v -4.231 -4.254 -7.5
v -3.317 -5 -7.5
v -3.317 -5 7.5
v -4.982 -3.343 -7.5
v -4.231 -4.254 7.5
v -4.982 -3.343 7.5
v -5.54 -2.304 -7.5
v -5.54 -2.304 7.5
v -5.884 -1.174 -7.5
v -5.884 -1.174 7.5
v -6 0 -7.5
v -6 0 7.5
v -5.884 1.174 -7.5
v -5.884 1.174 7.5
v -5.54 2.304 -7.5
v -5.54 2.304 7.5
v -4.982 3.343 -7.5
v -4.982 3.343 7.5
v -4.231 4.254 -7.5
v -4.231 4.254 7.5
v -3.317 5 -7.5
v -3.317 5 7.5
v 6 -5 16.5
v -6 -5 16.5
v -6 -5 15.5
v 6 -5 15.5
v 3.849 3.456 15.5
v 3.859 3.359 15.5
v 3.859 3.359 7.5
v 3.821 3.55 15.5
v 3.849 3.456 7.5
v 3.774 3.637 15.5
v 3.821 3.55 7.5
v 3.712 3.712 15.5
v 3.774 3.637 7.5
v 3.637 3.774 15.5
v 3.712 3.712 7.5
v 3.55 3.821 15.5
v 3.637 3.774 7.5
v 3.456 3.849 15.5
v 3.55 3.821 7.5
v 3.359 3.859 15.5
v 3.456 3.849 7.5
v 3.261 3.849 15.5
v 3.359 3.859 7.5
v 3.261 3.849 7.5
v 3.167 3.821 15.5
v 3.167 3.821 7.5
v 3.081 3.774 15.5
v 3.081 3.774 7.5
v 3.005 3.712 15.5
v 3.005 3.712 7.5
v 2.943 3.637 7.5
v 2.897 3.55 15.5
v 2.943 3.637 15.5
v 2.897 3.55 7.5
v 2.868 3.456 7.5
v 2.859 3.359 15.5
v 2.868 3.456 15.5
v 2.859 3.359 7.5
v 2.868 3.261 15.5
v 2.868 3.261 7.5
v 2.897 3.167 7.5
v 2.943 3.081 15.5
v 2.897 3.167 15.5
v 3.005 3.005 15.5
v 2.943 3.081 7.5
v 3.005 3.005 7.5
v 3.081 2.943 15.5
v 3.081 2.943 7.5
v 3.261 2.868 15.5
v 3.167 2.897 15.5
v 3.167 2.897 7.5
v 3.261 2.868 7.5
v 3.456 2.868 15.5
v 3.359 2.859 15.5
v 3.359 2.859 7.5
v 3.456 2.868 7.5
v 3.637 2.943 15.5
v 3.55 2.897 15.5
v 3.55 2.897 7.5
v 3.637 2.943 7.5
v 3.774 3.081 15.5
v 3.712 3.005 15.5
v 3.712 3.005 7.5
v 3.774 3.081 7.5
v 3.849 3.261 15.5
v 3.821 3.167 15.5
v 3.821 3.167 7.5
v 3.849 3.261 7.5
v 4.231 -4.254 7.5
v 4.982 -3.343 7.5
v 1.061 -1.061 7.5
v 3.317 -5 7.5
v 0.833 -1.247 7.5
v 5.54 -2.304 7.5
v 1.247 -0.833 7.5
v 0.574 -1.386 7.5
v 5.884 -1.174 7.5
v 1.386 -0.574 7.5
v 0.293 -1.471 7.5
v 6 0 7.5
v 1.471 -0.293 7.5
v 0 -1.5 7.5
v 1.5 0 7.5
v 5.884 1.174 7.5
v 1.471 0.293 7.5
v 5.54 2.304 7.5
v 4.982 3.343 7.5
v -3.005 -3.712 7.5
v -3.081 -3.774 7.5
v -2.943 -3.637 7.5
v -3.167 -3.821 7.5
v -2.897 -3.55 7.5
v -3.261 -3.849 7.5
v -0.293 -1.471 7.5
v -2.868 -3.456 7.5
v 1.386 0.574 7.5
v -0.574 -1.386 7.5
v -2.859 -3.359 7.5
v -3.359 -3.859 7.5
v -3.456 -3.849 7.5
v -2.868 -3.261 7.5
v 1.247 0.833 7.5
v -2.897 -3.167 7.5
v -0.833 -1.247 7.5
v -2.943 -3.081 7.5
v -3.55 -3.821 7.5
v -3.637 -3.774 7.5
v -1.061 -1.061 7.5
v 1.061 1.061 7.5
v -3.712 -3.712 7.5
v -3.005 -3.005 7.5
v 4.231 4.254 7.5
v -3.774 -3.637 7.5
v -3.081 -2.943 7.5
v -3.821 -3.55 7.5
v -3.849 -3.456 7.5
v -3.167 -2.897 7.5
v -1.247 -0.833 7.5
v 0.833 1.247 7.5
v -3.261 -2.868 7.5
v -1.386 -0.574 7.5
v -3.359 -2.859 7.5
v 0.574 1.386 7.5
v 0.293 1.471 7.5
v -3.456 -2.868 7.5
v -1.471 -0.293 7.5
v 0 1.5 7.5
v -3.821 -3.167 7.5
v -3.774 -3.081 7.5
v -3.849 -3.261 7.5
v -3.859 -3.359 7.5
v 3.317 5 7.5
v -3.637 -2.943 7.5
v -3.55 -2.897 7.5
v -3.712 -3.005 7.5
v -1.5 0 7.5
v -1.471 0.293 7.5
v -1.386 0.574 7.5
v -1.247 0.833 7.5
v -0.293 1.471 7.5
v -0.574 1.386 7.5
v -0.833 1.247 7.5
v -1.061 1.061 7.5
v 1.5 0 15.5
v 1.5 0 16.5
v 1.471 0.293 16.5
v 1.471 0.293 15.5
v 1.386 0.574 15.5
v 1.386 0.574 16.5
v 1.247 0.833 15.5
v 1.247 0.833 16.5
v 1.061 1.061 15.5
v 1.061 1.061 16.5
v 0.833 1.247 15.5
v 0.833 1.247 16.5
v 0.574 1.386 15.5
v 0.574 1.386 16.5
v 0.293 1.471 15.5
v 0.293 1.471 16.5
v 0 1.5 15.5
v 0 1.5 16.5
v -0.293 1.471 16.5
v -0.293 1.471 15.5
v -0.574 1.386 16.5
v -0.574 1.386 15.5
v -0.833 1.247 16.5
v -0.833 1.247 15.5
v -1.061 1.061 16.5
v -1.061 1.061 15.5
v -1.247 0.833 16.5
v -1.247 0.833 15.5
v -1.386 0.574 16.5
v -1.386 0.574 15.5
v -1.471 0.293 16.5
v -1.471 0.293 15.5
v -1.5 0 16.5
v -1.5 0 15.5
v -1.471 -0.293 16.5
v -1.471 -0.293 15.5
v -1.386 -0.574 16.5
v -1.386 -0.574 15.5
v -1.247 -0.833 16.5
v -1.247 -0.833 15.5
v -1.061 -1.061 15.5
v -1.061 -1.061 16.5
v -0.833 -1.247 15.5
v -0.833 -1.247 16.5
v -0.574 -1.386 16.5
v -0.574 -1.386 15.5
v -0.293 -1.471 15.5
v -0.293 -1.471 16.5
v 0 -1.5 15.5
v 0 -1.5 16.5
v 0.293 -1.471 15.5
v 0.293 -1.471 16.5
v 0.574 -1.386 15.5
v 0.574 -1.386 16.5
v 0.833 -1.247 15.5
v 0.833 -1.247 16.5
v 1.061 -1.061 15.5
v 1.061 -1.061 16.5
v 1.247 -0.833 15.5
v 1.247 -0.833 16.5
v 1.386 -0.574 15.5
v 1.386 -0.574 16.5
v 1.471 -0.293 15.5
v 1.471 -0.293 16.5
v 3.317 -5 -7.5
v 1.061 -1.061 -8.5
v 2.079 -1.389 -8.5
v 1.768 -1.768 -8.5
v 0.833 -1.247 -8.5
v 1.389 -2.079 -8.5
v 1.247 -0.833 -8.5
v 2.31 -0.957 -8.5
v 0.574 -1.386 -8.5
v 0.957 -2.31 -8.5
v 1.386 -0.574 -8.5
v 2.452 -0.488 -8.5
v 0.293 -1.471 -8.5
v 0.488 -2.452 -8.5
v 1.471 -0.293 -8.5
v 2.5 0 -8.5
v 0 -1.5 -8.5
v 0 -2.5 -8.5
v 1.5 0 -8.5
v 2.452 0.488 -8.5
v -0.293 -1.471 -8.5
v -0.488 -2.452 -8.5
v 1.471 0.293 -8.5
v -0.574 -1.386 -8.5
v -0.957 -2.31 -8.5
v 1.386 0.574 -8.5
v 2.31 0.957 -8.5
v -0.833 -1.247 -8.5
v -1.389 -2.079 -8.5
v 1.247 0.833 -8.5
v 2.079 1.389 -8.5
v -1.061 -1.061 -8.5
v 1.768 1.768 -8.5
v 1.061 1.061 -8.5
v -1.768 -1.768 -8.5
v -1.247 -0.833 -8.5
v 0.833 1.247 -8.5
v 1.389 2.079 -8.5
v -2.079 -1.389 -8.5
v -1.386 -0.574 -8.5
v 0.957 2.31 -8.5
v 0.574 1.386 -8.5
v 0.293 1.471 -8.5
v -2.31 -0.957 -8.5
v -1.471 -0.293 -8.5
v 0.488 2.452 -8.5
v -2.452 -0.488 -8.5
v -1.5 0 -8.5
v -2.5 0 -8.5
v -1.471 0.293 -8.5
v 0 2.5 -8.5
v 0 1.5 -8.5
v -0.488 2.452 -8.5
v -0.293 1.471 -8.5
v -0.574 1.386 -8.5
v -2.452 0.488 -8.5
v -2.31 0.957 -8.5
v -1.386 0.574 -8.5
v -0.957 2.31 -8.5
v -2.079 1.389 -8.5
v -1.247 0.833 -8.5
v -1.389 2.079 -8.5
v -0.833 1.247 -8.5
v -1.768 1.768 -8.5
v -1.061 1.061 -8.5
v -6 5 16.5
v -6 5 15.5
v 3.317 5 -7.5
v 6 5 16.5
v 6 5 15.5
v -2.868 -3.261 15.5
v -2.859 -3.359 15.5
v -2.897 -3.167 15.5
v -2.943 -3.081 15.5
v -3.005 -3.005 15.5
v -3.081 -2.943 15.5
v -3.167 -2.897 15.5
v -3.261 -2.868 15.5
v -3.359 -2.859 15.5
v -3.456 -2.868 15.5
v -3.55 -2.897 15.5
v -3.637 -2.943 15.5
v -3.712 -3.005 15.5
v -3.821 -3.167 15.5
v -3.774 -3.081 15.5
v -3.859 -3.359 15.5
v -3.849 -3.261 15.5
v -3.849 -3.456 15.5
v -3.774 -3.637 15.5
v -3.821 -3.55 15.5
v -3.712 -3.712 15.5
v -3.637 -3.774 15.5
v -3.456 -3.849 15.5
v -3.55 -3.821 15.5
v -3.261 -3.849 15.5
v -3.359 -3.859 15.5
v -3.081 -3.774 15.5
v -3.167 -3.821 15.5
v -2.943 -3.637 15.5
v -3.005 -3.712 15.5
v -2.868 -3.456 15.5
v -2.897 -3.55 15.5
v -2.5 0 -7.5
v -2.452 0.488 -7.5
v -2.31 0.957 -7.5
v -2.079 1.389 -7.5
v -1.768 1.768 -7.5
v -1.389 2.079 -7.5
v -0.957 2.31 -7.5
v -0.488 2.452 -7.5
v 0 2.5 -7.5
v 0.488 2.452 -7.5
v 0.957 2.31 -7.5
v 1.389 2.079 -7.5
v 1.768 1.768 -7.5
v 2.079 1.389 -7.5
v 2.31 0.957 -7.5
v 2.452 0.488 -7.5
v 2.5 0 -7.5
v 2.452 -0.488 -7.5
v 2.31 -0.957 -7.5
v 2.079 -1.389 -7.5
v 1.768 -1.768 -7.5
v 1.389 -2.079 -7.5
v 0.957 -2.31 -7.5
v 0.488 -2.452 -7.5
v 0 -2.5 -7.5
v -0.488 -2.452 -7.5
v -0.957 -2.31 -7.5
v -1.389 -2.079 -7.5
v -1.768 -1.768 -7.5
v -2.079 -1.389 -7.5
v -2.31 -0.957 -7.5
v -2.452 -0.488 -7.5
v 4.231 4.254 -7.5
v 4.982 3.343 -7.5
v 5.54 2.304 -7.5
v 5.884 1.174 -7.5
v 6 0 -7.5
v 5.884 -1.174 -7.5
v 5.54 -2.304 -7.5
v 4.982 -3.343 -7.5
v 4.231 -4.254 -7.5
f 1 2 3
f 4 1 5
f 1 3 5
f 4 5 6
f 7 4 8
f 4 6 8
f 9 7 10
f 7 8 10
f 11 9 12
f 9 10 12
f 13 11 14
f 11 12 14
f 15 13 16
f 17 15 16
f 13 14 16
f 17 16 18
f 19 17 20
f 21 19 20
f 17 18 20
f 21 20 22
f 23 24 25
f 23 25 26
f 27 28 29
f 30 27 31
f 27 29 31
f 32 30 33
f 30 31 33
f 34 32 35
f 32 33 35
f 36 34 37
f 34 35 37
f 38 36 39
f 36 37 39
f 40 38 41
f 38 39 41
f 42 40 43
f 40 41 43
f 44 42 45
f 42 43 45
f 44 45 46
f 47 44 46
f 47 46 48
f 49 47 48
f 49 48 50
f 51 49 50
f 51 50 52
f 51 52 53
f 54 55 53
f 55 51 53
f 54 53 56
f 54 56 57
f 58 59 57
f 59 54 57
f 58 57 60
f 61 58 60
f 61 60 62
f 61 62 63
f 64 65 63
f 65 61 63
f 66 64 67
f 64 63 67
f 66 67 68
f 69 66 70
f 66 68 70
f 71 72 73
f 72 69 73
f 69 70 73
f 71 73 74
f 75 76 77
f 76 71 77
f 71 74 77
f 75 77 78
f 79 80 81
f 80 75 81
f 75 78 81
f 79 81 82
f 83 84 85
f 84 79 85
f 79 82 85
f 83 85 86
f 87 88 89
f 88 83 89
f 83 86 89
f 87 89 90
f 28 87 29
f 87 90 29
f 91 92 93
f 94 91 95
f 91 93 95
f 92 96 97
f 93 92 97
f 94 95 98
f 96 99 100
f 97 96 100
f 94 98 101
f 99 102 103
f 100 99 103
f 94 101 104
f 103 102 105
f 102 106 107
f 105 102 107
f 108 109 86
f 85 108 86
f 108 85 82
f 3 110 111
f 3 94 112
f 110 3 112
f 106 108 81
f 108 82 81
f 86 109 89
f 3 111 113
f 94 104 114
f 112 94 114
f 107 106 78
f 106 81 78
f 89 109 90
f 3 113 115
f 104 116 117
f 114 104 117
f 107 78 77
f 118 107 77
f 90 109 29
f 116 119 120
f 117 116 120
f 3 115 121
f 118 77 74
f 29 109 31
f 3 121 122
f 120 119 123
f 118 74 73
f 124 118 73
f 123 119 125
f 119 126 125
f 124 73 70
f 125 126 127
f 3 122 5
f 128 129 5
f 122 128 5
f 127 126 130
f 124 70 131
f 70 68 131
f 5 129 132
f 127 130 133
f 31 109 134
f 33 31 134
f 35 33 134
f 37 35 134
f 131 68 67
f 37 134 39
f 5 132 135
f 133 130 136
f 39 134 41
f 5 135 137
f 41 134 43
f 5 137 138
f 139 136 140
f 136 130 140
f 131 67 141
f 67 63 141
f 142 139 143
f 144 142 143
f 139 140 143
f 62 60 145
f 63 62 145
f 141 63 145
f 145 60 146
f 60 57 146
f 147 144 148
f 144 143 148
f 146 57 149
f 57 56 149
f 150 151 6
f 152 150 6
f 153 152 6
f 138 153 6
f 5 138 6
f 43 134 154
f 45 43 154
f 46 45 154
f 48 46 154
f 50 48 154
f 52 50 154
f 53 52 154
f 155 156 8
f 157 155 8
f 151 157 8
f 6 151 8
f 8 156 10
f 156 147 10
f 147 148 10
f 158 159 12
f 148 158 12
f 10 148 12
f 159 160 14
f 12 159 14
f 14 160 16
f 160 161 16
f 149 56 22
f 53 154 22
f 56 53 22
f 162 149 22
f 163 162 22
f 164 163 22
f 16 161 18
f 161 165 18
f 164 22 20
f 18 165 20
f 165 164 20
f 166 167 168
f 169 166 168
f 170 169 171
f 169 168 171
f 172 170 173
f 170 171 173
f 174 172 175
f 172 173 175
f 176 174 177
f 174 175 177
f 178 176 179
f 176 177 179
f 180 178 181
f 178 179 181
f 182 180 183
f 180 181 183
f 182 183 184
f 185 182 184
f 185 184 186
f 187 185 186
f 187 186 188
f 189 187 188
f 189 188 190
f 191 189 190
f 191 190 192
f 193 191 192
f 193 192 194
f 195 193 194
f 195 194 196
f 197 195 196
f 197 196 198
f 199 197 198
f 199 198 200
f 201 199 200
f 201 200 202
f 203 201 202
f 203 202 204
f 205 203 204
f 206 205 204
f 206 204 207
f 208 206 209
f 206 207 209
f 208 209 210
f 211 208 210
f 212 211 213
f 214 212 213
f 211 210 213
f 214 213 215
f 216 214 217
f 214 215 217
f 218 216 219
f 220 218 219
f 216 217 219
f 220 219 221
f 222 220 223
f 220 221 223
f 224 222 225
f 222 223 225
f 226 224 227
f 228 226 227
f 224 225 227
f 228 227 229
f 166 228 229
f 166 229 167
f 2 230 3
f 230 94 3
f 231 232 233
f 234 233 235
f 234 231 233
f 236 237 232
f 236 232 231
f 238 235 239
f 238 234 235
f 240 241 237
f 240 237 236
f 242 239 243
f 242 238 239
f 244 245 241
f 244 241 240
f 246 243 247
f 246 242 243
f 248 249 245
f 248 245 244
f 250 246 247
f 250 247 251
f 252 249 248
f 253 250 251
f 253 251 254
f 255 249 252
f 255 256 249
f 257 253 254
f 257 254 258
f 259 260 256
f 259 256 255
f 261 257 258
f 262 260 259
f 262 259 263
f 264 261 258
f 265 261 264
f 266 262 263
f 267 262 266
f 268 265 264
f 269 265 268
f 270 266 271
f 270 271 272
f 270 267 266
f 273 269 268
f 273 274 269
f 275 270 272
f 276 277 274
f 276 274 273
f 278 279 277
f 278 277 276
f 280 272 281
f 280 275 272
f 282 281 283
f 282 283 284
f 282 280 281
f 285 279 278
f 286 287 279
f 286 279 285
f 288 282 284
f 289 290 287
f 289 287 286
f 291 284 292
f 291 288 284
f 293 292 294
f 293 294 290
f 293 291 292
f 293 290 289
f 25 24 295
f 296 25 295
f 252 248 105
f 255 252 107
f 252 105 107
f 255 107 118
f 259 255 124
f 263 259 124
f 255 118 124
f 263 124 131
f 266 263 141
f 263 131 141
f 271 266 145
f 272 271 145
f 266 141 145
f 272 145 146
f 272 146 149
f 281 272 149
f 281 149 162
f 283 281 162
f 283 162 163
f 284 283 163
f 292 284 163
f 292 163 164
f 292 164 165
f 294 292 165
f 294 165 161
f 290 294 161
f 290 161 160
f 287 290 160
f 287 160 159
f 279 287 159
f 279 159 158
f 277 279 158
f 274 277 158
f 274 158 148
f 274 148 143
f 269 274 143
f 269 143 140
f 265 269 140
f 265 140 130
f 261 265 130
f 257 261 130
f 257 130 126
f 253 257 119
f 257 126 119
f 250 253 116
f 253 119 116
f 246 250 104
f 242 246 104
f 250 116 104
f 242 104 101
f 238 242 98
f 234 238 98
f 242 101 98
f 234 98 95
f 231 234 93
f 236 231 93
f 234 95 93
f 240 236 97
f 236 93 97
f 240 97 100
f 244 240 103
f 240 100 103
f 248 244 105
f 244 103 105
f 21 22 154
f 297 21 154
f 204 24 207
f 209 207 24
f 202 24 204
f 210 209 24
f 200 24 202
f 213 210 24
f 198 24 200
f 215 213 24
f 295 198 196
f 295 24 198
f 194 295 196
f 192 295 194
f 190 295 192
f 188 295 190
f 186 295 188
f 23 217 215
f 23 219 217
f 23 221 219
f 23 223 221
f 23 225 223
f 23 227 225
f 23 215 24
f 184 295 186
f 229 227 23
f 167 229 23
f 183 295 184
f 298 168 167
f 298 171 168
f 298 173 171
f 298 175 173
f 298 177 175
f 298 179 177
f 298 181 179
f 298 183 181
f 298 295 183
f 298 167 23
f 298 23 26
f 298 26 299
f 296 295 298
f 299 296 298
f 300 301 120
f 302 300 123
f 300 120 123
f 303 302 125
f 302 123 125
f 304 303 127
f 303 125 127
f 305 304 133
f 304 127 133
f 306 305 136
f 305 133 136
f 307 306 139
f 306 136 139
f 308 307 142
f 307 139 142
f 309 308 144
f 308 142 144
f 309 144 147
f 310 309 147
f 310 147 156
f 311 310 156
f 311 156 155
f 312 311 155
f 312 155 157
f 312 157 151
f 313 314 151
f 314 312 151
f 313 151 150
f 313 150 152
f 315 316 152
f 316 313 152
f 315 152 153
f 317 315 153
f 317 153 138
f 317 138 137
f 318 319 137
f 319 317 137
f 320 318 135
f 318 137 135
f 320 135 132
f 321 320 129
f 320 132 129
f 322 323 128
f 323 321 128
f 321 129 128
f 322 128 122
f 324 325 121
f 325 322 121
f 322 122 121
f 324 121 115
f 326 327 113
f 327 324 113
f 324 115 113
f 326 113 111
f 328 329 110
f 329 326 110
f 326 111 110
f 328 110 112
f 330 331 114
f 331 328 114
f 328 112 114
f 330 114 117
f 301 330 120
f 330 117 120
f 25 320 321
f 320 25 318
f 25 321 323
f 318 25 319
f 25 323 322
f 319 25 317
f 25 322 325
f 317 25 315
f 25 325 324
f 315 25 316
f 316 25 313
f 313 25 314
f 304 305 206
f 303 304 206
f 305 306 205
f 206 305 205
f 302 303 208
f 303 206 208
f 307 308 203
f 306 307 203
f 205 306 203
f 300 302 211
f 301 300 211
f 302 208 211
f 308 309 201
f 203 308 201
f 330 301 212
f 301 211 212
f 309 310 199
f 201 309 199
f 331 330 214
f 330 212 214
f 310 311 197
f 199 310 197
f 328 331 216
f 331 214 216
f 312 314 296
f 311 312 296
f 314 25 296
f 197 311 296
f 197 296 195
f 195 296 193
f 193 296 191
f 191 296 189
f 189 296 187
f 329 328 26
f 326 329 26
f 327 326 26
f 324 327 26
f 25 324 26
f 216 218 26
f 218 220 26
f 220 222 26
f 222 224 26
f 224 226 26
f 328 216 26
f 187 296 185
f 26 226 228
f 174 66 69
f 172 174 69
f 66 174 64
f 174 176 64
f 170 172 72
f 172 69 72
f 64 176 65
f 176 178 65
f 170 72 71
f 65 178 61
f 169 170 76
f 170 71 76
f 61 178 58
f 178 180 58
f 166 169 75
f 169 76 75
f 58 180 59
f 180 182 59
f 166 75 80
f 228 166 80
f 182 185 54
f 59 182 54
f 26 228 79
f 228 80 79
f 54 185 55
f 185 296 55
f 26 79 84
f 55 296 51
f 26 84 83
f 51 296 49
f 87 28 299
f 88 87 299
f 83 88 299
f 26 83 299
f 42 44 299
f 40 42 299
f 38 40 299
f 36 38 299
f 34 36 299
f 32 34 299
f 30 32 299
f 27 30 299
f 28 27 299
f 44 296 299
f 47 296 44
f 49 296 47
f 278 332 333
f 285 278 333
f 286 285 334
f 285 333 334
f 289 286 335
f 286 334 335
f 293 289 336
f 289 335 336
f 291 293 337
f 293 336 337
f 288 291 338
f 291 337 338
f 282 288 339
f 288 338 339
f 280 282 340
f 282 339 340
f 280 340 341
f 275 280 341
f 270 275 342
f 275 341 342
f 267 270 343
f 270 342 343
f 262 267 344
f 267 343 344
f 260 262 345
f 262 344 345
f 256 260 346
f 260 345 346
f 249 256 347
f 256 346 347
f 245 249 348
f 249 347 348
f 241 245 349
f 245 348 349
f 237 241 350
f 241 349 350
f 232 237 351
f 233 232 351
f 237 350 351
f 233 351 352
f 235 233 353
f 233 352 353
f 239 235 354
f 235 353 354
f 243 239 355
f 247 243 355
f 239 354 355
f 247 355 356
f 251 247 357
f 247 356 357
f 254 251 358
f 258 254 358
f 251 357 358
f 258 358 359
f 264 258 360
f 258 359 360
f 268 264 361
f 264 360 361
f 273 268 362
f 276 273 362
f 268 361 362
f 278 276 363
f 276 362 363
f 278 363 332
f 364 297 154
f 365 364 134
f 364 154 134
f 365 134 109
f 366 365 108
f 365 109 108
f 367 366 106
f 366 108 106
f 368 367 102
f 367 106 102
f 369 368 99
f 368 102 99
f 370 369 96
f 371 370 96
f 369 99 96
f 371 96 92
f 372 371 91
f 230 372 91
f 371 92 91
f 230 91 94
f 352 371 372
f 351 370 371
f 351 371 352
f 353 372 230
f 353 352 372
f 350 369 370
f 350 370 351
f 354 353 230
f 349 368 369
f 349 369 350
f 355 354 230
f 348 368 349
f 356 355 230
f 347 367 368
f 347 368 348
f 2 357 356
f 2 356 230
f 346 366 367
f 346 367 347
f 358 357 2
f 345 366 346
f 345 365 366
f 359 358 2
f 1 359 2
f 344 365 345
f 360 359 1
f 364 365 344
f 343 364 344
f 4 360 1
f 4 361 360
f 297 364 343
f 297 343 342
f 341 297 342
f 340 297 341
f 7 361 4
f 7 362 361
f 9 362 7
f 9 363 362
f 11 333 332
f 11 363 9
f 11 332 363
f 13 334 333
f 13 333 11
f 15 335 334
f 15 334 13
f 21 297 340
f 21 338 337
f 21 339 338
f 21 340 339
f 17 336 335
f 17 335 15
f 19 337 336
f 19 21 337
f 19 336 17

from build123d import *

# Parameters (mm, degrees)
BOSS_EXTRUDE1_DEPTH = 7.5
SKETCH2_R           = 2.5
BOSS_EXTRUDE2_DEPTH = 1
SKETCH3_R           = 0.5
BOSS_EXTRUDE3_DEPTH = 9
SKETCH4_W           = 12
SKETCH4_H           = 10
BOSS_EXTRUDE4_DEPTH = 1
SKETCH5_R           = 1.5
CUT_EXTRUDE1_DEPTH  = 26


with BuildPart() as part:
    # Sketch1 → Boss-Extrude1 (new body, symmetric)
    with BuildSketch(Plane.XY):
        with BuildLine():
            Line((-3.31662479, 5), (3.31662479, 5))
            ThreePointArc((3.31662479, 5), (6, 0), (3.31662479, -5))
            Line((3.31662479, -5), (-3.31662479, -5))
            ThreePointArc((-3.31662479, -5), (-6, 0), (-3.31662479, 5))
        make_face()
    extrude(amount=BOSS_EXTRUDE1_DEPTH, both=True)

    # Sketch2 → Boss-Extrude2 (add)
    with BuildSketch(Plane(origin=(0, 0, -7.5), x_dir=(-1, 0, 0), z_dir=(0, 0, -1))):
        Circle(SKETCH2_R)
    extrude(amount=BOSS_EXTRUDE2_DEPTH)

    # Sketch3 → Boss-Extrude3 (add)
    with BuildSketch(Plane.XY.offset(7.5)):
        with Locations((3.358757211, 3.358757211)):
            Circle(SKETCH3_R)
        with Locations((-3.358757211, -3.358757211)):
            Circle(SKETCH3_R)
    extrude(amount=BOSS_EXTRUDE3_DEPTH)

    # Sketch4 → Boss-Extrude4 (add)
    with BuildSketch(Plane.XY.offset(16.5)):
        Rectangle(SKETCH4_W, SKETCH4_H)
    extrude(amount=-BOSS_EXTRUDE4_DEPTH)

    # Sketch5 → Cut-Extrude1 (cut, through all)
    with BuildSketch(Plane.XY.offset(16.5)):
        Circle(SKETCH5_R)
    extrude(amount=-CUT_EXTRUDE1_DEPTH, mode=Mode.SUBTRACT)


solid = part.part
